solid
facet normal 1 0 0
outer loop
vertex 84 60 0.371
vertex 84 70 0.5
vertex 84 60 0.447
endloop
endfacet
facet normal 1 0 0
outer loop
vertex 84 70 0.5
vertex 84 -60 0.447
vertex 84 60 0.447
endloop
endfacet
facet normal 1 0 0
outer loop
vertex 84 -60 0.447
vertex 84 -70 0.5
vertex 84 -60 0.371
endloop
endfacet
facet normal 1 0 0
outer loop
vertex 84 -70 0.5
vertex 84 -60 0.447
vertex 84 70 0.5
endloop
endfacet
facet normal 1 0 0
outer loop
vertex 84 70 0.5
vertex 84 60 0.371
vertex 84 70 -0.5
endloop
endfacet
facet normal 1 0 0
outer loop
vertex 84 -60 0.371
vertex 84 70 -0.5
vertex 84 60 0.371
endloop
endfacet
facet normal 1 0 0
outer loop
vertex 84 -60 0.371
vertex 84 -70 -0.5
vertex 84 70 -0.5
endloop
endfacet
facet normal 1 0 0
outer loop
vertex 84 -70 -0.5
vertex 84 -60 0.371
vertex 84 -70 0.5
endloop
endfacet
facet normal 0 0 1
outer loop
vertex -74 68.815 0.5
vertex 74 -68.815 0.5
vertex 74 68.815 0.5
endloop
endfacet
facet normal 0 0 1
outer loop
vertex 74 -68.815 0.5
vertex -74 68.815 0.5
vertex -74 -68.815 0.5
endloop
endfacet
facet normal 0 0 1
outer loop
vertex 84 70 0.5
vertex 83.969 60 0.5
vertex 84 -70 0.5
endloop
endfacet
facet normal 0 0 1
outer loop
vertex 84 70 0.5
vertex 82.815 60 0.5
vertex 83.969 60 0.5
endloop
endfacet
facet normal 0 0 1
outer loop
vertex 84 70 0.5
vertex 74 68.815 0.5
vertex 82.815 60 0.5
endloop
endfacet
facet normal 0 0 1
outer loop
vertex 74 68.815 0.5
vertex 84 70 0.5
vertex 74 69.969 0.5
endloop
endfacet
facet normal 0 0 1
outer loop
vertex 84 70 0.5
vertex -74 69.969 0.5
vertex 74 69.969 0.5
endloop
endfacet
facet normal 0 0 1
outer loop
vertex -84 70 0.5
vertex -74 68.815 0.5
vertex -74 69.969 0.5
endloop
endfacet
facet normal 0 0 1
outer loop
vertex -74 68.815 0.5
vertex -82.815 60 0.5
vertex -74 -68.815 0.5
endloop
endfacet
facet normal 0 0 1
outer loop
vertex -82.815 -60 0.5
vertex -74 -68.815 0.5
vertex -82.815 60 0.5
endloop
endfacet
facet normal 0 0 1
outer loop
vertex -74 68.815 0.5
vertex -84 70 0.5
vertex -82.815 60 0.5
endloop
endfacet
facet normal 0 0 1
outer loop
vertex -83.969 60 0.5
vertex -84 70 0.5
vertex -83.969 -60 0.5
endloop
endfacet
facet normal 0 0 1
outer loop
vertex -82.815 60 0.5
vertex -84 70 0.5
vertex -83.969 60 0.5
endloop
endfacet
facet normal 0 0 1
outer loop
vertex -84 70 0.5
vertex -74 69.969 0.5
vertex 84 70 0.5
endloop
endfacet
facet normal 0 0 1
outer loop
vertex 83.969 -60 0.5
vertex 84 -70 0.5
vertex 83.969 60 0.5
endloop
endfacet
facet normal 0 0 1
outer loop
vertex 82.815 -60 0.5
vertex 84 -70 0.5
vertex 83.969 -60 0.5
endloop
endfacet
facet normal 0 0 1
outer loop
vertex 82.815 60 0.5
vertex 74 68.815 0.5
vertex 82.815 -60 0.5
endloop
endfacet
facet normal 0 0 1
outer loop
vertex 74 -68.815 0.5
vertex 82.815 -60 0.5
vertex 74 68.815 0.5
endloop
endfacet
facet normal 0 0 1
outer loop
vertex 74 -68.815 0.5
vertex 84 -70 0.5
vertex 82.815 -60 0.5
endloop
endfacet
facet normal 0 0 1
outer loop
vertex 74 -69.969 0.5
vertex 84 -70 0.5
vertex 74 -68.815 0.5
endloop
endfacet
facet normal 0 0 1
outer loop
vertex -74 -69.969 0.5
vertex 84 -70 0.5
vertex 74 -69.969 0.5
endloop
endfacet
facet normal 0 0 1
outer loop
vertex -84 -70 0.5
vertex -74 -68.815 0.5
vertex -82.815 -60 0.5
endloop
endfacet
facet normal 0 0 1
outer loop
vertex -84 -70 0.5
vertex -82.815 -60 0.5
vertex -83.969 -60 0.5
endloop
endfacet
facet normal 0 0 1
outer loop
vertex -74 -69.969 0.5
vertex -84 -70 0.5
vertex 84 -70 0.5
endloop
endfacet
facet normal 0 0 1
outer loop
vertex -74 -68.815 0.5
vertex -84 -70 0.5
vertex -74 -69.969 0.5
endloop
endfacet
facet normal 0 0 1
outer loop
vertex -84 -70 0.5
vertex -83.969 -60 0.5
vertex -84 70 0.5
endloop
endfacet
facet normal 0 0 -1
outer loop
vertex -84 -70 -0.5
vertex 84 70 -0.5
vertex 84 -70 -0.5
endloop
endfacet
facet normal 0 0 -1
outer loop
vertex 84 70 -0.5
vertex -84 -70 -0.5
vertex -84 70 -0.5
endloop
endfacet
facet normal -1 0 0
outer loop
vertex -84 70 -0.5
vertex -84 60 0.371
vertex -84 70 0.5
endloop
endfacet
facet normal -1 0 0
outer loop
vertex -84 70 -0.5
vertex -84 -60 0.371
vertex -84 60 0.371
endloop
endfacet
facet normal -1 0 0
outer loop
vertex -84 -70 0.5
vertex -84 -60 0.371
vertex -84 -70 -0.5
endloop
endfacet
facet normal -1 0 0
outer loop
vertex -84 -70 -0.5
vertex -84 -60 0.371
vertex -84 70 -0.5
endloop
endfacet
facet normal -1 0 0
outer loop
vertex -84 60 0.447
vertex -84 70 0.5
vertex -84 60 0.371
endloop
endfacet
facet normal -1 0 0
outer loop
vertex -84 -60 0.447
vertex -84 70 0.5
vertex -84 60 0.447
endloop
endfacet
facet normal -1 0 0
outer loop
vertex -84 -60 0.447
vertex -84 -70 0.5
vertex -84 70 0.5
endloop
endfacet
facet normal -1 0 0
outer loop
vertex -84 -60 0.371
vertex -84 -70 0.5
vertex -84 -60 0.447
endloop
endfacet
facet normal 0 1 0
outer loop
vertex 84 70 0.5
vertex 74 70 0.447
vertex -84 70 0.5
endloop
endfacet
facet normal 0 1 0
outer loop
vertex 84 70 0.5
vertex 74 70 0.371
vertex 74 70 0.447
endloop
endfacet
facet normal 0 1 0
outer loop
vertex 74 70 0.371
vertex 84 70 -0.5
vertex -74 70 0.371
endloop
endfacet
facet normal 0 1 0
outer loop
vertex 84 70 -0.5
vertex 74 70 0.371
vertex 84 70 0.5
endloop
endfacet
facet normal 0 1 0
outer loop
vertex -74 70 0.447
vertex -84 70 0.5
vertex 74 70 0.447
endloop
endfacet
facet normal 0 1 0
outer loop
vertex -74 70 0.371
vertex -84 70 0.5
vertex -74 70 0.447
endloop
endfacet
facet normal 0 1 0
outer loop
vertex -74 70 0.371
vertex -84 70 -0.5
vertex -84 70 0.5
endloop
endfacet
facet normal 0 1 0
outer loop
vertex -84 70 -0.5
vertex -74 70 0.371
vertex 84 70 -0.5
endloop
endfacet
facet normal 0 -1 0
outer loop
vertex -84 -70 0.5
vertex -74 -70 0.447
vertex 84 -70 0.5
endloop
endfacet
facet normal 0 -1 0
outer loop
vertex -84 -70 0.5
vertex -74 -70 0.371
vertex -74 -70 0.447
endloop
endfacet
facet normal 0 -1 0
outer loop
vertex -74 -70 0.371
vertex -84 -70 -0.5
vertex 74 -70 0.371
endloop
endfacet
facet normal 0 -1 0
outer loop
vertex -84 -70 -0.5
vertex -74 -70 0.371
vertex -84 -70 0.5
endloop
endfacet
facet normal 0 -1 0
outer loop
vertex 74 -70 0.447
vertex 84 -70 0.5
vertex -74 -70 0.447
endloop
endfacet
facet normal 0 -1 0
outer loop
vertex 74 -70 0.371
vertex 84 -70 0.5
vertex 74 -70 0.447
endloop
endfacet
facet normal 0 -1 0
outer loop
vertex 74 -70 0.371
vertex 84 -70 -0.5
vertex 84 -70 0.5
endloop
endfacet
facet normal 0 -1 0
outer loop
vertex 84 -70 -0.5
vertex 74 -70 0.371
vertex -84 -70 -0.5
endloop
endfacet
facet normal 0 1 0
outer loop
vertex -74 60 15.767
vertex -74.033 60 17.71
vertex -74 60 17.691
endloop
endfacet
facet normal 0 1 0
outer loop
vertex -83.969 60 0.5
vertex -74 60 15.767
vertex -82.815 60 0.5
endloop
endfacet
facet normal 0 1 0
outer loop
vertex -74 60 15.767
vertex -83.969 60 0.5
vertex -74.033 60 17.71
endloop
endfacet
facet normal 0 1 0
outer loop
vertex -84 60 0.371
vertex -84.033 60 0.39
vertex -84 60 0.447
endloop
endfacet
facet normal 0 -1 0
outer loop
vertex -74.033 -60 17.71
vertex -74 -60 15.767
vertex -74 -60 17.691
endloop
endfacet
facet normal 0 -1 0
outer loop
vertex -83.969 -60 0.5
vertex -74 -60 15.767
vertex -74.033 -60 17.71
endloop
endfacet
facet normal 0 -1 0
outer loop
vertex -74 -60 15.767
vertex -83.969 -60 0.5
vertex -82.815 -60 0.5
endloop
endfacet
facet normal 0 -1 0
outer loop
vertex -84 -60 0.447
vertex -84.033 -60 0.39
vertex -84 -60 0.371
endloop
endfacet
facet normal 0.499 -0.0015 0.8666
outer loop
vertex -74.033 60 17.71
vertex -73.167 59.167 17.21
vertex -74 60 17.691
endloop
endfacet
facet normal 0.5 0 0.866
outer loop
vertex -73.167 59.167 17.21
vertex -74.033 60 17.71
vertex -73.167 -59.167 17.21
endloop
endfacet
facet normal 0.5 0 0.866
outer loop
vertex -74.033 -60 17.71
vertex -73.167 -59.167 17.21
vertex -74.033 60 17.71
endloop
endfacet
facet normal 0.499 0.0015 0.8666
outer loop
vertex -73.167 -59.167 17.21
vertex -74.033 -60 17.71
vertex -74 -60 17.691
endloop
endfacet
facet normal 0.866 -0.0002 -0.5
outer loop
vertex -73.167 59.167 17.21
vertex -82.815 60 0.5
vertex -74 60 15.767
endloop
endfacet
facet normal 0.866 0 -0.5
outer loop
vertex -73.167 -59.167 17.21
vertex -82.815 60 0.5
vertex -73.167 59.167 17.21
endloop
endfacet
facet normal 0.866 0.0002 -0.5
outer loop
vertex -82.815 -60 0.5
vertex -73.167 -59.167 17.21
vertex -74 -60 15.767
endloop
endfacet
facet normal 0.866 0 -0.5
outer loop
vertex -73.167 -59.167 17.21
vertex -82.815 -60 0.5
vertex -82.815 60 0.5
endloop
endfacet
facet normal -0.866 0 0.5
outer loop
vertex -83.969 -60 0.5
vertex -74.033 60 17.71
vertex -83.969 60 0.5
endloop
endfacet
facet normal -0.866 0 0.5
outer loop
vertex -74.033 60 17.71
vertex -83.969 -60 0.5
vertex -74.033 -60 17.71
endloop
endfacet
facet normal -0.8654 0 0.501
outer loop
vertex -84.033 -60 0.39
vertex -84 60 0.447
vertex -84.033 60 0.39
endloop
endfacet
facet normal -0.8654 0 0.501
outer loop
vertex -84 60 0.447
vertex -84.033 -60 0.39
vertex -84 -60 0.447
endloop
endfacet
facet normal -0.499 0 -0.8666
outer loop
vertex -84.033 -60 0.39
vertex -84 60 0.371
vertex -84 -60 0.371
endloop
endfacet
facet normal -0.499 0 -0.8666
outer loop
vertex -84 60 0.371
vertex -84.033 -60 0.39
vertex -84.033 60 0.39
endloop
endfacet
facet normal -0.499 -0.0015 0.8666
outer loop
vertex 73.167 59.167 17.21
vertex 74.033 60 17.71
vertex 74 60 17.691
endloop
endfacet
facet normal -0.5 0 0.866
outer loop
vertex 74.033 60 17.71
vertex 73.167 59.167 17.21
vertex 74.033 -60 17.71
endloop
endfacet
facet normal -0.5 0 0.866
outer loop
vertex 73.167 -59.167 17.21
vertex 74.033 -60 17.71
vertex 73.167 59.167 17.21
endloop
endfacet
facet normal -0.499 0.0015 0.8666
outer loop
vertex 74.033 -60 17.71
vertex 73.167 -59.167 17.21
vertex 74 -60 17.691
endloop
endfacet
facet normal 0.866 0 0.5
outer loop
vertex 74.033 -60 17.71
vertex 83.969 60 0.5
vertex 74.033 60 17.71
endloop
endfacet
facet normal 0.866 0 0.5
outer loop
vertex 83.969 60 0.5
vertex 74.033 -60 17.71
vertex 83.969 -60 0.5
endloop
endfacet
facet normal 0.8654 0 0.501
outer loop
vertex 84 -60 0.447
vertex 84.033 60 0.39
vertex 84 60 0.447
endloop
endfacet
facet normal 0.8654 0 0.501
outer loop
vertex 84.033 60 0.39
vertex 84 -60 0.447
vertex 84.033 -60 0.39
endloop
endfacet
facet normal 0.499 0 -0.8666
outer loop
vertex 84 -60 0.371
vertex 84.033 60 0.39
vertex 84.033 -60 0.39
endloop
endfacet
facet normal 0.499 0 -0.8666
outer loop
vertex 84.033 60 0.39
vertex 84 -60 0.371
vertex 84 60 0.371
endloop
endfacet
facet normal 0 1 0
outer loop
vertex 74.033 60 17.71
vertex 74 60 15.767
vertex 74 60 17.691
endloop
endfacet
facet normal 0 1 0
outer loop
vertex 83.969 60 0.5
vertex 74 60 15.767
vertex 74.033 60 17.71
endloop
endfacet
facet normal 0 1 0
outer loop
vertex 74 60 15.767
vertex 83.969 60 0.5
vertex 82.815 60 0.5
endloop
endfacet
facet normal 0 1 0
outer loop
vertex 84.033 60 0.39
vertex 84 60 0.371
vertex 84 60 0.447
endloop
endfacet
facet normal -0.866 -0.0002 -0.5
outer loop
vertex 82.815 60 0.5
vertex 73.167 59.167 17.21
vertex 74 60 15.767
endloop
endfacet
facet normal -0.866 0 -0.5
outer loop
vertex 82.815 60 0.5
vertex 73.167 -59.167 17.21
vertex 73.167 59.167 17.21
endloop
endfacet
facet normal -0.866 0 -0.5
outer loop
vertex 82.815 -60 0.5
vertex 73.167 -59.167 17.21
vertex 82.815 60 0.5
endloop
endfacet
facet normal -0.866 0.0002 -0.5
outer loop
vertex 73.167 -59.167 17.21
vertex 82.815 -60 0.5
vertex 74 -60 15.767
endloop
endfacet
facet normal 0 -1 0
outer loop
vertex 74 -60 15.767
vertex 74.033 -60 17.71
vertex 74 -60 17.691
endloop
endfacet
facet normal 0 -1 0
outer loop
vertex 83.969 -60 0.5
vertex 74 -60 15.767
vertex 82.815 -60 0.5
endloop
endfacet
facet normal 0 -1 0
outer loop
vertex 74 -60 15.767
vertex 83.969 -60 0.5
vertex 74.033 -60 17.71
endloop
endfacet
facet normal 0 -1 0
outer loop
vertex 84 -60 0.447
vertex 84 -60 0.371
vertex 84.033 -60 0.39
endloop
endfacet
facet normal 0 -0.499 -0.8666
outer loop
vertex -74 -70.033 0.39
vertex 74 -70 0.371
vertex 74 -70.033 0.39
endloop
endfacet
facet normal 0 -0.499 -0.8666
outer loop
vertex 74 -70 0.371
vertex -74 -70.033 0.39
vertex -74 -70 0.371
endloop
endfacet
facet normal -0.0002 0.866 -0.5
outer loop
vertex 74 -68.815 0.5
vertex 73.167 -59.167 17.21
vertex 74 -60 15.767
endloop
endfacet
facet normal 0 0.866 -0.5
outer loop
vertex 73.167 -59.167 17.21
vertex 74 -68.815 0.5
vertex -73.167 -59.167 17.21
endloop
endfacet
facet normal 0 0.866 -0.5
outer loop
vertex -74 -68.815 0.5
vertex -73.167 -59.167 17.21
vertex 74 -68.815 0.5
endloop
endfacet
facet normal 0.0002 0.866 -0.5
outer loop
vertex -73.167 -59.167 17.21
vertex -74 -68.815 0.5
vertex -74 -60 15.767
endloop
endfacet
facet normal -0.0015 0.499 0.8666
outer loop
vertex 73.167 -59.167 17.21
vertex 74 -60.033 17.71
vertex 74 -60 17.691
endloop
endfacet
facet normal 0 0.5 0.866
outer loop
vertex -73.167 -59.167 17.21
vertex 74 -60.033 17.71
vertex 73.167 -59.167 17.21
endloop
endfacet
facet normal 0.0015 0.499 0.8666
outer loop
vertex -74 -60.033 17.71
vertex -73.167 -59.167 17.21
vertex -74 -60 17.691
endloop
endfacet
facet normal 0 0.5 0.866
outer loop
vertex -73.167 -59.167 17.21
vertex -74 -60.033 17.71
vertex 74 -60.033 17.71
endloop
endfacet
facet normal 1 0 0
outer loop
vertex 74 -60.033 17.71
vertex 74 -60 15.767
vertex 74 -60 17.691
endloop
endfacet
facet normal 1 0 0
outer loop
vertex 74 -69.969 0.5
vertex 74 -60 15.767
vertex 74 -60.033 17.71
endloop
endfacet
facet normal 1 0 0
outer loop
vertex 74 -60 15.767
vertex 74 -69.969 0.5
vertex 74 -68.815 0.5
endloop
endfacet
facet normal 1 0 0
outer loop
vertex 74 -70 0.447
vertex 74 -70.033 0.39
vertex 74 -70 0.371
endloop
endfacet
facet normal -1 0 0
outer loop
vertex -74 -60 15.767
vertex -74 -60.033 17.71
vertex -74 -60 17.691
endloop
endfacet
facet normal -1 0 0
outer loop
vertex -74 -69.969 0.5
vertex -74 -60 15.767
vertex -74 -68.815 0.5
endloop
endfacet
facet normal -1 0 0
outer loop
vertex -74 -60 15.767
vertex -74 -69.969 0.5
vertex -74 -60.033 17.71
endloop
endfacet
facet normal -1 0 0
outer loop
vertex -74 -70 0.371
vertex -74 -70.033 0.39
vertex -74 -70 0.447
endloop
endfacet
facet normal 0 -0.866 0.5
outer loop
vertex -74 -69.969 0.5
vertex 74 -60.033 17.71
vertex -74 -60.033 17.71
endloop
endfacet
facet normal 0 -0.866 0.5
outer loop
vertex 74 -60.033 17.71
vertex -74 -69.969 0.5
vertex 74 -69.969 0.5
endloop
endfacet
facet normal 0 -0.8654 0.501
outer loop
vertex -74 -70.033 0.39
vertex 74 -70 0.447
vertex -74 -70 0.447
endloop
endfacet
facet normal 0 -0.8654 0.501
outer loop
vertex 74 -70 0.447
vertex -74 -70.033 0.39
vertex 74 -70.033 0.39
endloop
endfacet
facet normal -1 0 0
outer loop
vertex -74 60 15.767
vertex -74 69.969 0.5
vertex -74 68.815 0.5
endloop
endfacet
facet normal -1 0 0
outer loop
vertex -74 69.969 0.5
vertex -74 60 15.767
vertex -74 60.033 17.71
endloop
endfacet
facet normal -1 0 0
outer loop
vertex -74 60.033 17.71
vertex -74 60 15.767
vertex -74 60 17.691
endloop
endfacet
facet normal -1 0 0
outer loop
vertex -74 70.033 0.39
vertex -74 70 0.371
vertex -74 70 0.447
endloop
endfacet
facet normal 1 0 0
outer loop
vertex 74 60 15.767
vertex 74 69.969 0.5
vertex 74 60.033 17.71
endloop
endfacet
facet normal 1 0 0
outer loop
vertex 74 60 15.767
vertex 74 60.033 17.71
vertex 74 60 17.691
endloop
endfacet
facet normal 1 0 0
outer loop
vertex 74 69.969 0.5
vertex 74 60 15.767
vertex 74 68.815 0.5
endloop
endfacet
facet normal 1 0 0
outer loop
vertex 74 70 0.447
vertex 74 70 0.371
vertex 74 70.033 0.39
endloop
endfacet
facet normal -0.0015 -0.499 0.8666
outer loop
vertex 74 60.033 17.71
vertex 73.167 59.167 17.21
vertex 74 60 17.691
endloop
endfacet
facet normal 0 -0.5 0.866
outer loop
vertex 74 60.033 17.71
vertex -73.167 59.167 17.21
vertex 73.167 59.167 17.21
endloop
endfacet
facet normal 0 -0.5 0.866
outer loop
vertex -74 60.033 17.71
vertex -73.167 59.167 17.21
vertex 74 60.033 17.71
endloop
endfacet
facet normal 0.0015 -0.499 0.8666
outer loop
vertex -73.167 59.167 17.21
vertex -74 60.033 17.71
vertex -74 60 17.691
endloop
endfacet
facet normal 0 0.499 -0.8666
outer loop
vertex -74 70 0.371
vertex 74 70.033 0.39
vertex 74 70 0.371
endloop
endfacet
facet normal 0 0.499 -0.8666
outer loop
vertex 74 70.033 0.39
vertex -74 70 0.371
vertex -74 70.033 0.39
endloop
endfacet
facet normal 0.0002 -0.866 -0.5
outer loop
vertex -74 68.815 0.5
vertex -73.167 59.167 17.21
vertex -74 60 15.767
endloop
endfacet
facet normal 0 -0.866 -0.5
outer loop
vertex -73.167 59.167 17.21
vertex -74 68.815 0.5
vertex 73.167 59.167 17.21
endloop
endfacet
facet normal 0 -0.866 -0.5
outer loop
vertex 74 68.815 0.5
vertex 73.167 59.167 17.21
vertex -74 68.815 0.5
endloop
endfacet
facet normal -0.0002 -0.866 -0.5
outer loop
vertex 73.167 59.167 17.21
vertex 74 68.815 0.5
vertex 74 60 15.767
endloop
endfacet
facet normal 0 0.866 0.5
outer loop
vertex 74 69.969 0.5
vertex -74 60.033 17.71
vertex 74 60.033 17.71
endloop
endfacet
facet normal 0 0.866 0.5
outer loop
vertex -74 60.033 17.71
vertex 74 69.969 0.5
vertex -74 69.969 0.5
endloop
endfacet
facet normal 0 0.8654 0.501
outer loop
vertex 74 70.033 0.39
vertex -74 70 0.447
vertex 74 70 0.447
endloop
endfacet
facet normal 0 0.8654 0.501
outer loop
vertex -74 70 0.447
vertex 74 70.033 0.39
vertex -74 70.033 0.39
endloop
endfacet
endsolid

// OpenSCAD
module coverplate(
    width=168,
    height=140,
    thickness=1,    
    wallheight=20
)
{
    cutback=wallheight;
    
    cube([width,height,thickness],center=true);
    
    translate([-width/2+(wallheight/2)*sin(30)+thickness*0.4,0,wallheight*0.44])rotate([0,30,0])cube([thickness,height-cutback,wallheight],center=true); 
    
    translate([width/2-(wallheight/2)*sin(30)-thickness*0.4,0,wallheight*0.44])rotate([0,-30,0])cube([thickness,height-cutback,wallheight],center=true); 
    
    translate([0,-height/2+(wallheight/2)*sin(30)+thickness*0.4,wallheight*0.44])rotate([-30,0,0])cube([width-cutback,thickness,wallheight],center=true); 
    
    translate([0,height/2-(wallheight/2)*sin(30)-thickness*0.4,wallheight*0.44])rotate([30,0,0])cube([width-cutback,thickness,wallheight],center=true); 
}

difference()
{
    coverplate(width=168);
    //translate([10,0,0])cube([168,200,10],center=true);
}
